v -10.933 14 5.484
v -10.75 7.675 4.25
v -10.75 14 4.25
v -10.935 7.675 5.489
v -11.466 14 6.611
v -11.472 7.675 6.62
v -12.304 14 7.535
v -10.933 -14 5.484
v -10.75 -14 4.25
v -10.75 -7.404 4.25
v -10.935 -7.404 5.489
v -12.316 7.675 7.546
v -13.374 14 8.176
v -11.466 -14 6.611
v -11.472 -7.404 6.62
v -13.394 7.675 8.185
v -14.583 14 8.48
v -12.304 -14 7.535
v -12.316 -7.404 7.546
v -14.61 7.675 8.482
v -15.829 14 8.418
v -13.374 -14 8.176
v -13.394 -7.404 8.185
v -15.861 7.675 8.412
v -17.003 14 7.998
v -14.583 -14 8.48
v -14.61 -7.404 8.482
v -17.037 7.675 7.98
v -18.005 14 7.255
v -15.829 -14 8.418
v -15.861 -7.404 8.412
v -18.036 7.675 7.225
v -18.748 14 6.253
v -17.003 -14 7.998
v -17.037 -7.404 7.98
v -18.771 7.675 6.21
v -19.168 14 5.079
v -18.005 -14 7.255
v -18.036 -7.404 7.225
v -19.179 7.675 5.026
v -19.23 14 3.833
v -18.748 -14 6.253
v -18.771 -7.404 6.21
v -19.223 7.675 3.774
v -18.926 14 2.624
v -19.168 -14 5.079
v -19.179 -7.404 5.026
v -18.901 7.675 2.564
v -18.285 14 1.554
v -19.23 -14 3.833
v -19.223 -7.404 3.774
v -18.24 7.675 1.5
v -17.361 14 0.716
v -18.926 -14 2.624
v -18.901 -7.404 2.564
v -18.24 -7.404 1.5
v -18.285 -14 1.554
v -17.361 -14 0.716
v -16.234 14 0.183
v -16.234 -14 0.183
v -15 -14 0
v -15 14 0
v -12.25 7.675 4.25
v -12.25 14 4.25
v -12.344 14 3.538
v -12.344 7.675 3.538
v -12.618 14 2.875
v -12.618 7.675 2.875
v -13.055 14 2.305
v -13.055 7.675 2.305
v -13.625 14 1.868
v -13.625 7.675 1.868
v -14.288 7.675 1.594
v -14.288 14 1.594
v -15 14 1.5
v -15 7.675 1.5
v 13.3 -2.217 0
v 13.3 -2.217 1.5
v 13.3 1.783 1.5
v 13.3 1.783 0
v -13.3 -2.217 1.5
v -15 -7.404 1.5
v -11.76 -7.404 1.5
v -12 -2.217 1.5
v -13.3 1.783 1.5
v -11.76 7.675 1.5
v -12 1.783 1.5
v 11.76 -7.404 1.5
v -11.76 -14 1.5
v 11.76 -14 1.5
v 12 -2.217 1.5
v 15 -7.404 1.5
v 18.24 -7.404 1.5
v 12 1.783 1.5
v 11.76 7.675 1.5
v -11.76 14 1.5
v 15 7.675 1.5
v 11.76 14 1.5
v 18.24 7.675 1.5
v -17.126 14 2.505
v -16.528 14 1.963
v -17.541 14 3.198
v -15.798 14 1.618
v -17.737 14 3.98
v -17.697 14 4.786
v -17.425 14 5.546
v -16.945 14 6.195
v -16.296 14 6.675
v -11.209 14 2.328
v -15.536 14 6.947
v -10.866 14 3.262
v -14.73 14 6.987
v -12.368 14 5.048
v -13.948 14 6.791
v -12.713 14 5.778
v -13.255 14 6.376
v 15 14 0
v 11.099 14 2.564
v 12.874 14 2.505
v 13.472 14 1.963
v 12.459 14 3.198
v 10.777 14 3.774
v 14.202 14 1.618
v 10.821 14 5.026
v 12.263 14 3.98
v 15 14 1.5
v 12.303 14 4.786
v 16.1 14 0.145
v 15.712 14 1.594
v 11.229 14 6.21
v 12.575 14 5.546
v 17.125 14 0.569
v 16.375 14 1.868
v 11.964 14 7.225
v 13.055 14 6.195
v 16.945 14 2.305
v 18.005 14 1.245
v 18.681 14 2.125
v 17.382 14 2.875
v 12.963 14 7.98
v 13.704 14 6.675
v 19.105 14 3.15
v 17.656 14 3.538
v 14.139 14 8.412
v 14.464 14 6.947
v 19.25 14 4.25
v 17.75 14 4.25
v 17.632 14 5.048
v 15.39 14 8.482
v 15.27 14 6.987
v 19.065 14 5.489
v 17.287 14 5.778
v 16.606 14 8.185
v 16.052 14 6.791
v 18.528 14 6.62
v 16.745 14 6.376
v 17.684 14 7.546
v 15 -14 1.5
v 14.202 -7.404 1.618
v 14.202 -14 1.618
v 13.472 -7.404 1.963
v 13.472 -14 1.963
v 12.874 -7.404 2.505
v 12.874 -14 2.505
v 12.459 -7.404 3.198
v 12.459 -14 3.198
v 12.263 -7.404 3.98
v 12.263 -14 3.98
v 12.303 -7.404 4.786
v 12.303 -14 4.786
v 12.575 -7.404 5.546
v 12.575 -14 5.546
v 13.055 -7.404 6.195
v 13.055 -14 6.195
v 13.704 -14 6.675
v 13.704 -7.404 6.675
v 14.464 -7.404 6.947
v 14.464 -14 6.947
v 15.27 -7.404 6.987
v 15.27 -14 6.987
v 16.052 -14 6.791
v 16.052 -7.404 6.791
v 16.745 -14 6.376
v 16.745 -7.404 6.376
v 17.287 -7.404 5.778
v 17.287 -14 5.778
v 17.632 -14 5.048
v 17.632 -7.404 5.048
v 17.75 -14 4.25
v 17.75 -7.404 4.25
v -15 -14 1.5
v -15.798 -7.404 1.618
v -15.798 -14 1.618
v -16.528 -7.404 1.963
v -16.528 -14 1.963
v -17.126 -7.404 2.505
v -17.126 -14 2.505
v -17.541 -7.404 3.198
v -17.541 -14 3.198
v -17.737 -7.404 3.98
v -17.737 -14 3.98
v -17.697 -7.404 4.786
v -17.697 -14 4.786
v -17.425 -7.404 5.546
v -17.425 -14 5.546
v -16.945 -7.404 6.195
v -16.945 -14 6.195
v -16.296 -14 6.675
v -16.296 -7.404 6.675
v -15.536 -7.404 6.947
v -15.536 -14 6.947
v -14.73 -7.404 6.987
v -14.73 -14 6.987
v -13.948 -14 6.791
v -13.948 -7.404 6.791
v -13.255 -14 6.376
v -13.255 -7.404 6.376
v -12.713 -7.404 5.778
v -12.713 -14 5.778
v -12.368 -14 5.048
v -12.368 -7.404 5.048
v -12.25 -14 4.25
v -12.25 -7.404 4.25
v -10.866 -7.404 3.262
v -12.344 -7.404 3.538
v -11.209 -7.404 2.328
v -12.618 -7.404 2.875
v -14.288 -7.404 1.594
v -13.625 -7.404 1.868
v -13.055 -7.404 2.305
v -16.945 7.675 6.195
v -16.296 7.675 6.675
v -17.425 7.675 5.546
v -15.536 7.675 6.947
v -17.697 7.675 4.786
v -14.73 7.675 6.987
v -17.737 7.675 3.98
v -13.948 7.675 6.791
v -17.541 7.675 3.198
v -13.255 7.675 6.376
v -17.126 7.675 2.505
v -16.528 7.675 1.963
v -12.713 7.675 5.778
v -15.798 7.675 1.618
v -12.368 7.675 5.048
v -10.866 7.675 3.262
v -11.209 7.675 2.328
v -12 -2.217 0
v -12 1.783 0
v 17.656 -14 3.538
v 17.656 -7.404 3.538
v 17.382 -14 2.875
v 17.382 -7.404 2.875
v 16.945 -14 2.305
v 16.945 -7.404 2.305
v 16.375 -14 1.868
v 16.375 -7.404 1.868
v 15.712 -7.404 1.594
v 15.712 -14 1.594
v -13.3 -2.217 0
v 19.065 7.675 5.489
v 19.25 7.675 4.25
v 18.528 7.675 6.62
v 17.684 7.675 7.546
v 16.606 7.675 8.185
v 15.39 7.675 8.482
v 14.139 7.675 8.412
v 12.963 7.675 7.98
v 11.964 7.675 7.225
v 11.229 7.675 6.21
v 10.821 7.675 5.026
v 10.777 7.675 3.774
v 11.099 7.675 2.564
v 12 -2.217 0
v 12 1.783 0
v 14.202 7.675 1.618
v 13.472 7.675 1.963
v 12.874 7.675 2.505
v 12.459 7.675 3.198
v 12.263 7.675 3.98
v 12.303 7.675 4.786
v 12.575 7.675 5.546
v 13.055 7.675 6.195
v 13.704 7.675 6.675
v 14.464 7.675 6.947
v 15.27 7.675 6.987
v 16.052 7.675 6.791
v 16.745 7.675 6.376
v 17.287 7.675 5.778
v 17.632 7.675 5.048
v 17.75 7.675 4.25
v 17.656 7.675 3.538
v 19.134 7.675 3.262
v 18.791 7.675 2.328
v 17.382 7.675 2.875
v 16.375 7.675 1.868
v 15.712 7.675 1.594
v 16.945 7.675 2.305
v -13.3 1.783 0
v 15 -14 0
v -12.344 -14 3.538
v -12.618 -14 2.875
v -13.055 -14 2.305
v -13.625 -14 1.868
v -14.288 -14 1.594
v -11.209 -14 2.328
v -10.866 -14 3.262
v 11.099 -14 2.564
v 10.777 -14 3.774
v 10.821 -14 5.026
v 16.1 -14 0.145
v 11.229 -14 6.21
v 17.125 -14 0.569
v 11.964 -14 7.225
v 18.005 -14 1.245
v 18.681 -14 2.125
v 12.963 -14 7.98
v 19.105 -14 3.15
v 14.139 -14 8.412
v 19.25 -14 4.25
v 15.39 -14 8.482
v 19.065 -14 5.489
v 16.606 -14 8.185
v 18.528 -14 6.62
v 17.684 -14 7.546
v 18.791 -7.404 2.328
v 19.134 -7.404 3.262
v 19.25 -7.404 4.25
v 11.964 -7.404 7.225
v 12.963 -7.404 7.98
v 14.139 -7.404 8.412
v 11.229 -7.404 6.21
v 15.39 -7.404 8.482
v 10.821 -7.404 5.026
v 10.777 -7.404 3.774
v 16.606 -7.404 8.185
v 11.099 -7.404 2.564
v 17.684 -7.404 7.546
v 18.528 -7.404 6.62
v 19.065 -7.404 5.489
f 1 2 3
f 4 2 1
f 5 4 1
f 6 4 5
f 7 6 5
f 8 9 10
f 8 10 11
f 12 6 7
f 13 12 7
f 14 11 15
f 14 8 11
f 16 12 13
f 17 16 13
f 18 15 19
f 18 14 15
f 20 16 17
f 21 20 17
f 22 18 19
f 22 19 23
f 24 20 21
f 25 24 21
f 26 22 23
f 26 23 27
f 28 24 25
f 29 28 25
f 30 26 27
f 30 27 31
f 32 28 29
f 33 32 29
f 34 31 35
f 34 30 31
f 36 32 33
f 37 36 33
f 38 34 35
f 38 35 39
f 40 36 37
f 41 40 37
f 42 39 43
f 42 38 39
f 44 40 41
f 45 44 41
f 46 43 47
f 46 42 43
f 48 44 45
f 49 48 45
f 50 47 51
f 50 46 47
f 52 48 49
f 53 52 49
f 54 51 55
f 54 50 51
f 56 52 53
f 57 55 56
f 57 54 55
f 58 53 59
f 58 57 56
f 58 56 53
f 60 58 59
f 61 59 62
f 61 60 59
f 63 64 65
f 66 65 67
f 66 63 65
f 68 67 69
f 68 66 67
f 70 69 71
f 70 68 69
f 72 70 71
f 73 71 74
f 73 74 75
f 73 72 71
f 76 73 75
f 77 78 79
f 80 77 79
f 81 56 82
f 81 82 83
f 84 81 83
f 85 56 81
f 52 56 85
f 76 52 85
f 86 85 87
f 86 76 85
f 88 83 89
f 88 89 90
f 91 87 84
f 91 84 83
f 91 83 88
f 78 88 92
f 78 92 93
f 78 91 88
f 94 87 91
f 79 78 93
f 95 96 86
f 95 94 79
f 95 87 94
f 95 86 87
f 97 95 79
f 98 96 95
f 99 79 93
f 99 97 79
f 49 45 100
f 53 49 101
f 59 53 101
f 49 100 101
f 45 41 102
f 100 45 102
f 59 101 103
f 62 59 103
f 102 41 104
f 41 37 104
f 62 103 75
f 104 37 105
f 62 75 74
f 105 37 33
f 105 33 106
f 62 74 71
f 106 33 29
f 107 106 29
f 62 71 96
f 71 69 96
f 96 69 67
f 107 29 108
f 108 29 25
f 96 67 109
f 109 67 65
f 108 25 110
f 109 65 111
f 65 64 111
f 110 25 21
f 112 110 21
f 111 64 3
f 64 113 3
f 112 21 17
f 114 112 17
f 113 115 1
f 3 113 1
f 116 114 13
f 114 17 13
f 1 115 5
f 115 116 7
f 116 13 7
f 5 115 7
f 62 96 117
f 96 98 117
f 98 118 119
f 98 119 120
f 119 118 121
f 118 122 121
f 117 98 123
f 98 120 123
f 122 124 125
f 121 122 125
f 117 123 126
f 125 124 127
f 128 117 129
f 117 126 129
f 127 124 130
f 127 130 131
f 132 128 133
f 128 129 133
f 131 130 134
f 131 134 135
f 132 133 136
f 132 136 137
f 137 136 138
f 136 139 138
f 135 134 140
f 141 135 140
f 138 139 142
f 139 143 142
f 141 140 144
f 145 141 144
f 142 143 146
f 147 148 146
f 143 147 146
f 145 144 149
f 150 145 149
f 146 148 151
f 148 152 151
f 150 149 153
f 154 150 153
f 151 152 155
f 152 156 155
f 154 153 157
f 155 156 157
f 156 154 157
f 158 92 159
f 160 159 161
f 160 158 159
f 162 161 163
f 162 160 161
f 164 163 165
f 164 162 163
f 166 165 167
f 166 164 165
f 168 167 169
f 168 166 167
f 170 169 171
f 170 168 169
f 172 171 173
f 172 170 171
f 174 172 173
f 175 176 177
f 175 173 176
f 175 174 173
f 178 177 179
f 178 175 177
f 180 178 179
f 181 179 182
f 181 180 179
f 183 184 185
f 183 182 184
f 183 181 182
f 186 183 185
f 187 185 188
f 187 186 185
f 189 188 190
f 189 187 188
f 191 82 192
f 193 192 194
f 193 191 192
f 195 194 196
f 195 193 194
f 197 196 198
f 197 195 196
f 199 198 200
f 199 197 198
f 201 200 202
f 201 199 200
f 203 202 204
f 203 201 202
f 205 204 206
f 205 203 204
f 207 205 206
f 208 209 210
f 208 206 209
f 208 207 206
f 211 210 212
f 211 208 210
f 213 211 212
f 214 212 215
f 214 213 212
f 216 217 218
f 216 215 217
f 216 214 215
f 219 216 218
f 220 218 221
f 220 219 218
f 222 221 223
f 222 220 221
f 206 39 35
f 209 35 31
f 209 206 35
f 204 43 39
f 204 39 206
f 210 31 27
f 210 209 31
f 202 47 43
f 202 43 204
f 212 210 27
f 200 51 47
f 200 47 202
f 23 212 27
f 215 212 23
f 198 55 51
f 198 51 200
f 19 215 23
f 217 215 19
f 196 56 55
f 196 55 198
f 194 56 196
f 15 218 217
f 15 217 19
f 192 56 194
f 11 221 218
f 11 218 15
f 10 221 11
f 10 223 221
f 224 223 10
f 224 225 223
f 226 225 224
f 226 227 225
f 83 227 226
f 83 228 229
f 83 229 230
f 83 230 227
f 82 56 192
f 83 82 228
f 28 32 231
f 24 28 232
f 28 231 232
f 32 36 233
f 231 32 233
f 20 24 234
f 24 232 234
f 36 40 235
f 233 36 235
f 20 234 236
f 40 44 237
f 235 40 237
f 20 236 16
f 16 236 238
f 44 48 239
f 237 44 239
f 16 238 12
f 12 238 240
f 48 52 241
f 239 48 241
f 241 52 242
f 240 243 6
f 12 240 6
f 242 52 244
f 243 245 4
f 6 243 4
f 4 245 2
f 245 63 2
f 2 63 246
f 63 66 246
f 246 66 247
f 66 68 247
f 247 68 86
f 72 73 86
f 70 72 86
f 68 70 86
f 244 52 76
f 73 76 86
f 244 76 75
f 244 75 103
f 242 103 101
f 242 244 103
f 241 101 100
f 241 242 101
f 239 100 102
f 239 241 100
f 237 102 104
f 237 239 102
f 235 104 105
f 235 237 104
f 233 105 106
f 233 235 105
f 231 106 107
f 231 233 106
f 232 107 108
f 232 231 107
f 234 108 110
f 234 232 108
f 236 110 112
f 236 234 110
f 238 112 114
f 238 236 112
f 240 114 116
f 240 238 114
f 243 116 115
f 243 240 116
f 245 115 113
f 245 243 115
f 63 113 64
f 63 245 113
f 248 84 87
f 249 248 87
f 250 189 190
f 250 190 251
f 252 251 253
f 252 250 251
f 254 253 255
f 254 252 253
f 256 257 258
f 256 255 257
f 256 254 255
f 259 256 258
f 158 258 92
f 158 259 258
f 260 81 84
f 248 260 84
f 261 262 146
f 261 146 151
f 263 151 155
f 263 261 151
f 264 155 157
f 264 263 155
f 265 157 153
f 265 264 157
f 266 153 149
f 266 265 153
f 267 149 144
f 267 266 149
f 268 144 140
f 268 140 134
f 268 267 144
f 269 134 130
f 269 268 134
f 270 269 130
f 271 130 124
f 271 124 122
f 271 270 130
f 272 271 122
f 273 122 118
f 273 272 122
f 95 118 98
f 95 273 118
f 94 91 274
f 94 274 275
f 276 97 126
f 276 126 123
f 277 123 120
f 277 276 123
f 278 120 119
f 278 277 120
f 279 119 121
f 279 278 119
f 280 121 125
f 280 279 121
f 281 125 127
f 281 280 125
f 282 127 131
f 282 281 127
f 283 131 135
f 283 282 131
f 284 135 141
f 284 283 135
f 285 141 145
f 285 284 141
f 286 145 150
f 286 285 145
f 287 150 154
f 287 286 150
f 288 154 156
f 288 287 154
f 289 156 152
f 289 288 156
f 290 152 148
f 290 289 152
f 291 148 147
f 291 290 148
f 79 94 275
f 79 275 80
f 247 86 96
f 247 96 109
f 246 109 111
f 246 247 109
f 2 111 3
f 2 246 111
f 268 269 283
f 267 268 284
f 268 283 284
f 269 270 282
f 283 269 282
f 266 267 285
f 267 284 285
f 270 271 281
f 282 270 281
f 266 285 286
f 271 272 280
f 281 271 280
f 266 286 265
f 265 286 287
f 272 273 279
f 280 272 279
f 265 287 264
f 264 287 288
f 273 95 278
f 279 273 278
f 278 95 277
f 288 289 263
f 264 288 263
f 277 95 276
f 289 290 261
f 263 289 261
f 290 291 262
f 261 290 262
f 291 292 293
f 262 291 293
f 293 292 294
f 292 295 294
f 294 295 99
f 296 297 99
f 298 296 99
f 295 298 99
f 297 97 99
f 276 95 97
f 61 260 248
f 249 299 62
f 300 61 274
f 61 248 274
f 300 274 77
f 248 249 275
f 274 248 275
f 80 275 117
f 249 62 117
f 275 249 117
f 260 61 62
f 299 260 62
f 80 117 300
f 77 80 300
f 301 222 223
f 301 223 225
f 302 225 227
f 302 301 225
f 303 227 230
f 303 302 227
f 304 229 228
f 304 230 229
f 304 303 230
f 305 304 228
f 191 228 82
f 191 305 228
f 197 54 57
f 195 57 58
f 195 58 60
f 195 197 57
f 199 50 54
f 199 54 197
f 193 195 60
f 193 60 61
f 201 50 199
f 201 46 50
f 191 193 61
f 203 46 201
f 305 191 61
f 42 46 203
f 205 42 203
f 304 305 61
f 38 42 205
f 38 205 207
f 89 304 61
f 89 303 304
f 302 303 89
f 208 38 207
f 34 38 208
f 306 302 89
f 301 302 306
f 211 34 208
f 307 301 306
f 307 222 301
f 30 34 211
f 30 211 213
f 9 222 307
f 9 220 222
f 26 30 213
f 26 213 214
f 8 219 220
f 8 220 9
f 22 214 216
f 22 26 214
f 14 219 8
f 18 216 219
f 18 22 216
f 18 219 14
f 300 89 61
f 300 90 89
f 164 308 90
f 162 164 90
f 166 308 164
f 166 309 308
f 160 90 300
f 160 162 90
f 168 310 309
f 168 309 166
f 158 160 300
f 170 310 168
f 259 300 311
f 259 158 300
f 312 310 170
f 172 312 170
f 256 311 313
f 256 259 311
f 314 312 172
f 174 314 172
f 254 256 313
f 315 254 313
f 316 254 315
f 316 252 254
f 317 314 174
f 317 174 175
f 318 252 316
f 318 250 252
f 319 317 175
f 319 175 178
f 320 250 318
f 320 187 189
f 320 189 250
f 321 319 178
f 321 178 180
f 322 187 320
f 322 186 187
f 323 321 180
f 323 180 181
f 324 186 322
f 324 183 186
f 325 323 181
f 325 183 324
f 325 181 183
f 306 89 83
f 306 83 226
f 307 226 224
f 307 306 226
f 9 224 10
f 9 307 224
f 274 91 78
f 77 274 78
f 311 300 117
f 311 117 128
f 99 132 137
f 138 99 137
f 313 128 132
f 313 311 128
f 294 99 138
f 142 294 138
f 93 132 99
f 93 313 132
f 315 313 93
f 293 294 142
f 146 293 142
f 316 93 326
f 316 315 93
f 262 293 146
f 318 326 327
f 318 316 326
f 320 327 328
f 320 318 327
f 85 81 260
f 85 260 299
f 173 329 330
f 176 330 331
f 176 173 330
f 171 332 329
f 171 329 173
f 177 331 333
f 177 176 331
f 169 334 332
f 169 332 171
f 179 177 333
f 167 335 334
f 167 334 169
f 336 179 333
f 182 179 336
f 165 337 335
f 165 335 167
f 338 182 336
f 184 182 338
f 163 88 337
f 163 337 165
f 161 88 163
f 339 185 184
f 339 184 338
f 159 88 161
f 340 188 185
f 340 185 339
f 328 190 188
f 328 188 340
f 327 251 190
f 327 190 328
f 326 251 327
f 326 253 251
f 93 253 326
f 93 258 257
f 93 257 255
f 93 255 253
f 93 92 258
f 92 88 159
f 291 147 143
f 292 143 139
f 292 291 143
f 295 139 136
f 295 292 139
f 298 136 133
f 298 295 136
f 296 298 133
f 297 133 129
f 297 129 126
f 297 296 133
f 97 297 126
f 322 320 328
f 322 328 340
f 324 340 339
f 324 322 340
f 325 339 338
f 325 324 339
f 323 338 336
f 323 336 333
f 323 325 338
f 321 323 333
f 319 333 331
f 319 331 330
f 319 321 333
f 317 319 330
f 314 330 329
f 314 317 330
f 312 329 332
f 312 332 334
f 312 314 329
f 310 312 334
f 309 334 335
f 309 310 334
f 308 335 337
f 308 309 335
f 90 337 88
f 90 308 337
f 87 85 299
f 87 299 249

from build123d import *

# Parameters (mm, degrees)
F0_W     = 30
F0_H     = 28
F1_DEPTH = 1.5
F3_DEPTH = 28
F4_W     = 1.3
F4_H     = 4
F5_DEPTH = 25
F6_W     = 41.33358
F6_H     = 15.079705
F7_DEPTH = 25


with BuildPart() as f1:
    # F0 (on Top) → F1 (new body)
    with BuildSketch(Plane.XY):
        Rectangle(F0_W, F0_H)
    extrude(amount=F1_DEPTH)

    # F2 (on face) → F3 (join)
    with BuildSketch(Plane.XZ.offset(14)):
        with BuildLine():
            ThreePointArc((-11.75963, 1.5), (-11.010384, 2.78526), (-10.75, 4.25))
            ThreePointArc((-10.75, 4.25), (-18.005204, 7.255204), (-15, 0))
            Line((-15, 0), (-15, 1.5))
            Line((-15, 1.5), (-11.75963, 1.5))
        make_face()
        with BuildLine():
            ThreePointArc((-12.25, 4.25), (-13.055456, 2.305456), (-15, 1.5))
            ThreePointArc((-15, 1.5), (-16.944544, 6.194544), (-12.25, 4.25))
        make_face(mode=Mode.SUBTRACT)
        with BuildLine():
            Line((15, 1.5), (15, 0))
            ThreePointArc((15, 0), (18.005204, 1.244796), (19.25, 4.25))
            ThreePointArc((19.25, 4.25), (13.53526, 8.239616), (11.75963, 1.5))
            Line((11.75963, 1.5), (15, 1.5))
        make_face()
        with BuildLine():
            ThreePointArc((17.75, 4.25), (16.944544, 2.305456), (15, 1.5))
            ThreePointArc((15, 1.5), (13.055456, 6.194544), (17.75, 4.25))
        make_face(mode=Mode.SUBTRACT)
        with BuildLine():
            Line((-15, 1.5), (-15, 0))
            ThreePointArc((-15, 0), (-13.214643, 0.393188), (-11.75963, 1.5))
            Line((-11.75963, 1.5), (-15, 1.5))
        make_face()
    extrude(amount=-F3_DEPTH)

    # F4 (on face) → F5 (cut)
    with BuildSketch(Plane.XY.offset(1.5)):
        with Locations((-12.65, -0.217311)):
            Rectangle(F4_W, F4_H)
        with Locations((12.65, -0.217311)):
            Rectangle(F4_W, F4_H)
    extrude(amount=-F5_DEPTH, mode=Mode.SUBTRACT)

    # F6 (on face) → F7 (cut)
    with BuildSketch(Plane.XY.offset(1.5)):
        with Locations((0.027121, 0.135609)):
            Rectangle(F6_W, F6_H)
    extrude(amount=F7_DEPTH, mode=Mode.SUBTRACT)


solid = f1.part
